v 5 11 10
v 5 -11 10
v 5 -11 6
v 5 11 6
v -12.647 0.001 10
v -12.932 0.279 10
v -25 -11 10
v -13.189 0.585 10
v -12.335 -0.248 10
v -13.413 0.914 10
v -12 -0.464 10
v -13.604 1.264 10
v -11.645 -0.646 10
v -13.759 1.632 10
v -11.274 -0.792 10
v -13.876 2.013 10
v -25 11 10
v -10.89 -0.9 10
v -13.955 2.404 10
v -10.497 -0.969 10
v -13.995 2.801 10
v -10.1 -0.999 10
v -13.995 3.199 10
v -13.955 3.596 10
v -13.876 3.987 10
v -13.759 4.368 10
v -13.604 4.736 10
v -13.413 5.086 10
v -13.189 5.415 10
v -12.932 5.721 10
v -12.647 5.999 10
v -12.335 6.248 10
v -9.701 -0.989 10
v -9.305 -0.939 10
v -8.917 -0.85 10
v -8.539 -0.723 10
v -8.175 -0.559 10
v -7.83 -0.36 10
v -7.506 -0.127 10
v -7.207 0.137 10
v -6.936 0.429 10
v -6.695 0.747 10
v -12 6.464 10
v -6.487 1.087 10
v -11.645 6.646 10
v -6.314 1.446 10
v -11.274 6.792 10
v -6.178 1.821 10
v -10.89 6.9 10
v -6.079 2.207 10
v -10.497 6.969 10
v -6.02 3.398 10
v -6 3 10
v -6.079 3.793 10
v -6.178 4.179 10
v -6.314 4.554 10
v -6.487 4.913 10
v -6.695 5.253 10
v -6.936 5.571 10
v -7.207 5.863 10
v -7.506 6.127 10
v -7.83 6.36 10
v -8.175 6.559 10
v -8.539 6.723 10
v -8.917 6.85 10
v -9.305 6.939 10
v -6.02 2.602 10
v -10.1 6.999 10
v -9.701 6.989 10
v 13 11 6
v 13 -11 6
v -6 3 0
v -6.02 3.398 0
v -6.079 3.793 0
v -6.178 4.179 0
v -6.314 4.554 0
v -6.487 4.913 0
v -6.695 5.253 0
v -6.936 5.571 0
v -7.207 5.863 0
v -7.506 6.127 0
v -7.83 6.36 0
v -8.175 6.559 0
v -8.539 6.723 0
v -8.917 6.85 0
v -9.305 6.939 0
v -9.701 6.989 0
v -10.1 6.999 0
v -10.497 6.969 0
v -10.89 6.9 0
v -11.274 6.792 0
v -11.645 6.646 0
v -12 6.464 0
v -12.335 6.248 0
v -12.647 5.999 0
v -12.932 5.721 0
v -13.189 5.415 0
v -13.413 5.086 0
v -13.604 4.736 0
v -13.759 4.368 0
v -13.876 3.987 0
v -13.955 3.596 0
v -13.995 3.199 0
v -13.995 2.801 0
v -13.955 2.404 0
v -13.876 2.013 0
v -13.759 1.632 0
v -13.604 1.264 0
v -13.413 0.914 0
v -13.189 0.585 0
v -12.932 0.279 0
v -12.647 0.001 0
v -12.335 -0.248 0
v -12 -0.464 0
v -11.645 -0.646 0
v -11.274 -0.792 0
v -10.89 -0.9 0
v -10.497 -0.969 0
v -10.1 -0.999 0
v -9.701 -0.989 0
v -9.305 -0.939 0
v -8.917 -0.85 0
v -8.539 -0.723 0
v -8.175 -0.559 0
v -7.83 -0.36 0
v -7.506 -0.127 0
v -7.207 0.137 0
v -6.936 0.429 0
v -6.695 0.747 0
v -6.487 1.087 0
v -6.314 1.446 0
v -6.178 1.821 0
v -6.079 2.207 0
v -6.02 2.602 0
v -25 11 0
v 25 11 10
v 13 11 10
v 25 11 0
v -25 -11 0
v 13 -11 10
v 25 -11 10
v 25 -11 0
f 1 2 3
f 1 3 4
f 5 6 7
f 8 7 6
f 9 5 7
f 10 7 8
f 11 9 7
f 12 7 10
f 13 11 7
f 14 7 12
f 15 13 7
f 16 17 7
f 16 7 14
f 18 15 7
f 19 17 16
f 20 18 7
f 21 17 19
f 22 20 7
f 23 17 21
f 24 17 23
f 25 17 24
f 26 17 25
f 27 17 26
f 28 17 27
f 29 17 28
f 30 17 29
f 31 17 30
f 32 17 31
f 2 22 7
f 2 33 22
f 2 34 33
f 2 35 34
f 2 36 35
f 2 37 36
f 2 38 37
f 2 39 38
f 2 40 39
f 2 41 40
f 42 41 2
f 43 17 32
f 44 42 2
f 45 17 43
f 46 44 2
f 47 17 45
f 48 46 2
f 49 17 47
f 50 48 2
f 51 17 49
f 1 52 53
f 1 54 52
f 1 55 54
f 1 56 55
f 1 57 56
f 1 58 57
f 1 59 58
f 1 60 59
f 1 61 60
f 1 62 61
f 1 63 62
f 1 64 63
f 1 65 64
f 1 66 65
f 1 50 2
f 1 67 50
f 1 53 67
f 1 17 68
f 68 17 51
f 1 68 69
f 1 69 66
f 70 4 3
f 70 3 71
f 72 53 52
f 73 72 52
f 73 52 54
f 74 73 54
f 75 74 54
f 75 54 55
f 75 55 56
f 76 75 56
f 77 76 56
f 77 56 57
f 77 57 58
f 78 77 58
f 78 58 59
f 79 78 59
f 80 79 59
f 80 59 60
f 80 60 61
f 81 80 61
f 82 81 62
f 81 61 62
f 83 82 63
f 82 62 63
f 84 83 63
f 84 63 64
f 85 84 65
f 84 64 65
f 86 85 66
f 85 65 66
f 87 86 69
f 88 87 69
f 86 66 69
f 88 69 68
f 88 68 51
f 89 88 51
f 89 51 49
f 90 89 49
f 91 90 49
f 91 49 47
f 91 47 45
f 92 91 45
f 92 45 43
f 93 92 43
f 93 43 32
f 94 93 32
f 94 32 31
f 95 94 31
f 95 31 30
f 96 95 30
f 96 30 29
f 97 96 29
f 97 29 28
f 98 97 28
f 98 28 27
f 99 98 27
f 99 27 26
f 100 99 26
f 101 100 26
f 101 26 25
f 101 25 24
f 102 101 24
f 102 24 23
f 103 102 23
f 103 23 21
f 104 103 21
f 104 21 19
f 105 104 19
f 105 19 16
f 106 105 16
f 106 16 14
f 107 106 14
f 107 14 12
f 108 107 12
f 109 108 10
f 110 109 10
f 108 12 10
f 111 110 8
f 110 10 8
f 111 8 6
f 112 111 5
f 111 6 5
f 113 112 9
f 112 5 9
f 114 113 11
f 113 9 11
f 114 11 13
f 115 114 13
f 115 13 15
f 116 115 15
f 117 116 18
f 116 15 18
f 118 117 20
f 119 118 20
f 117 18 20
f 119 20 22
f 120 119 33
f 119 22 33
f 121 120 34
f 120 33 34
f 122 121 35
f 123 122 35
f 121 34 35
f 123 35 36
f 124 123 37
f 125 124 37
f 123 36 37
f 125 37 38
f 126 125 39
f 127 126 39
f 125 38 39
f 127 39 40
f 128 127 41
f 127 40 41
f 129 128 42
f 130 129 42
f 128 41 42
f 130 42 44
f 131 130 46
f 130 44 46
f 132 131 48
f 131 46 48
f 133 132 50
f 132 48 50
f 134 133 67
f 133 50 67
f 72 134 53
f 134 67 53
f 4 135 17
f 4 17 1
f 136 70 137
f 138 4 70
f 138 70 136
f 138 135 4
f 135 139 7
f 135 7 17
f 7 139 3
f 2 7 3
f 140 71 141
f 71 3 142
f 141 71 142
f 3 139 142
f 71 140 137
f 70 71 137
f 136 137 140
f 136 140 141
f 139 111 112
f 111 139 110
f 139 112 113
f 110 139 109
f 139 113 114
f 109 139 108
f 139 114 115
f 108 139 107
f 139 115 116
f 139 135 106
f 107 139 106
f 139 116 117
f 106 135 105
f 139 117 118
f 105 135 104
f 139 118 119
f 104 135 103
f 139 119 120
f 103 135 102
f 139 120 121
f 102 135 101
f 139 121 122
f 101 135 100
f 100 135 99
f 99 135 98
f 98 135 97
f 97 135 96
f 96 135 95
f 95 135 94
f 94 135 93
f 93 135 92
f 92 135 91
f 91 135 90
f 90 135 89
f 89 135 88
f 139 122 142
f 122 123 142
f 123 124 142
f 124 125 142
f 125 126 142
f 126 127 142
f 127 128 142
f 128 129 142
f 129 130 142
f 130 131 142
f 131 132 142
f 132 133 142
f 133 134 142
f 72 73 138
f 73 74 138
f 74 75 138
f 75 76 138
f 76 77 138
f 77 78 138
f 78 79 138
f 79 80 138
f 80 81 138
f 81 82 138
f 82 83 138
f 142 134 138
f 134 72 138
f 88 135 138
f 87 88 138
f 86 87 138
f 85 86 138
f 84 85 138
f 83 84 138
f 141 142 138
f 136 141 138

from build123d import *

# Parameters (mm, degrees)
SKETCH_1_W          = 50
SKETCH_1_H          = 22
EXTRUDE_1_DEPTH     = 10
SKETCH_2_R          = 4
CUT_EXTRUDE_1_DEPTH = 30.086079144
SKETCH_3_W          = 8
SKETCH_3_H          = 22
CUT_EXTRUDE_2_DEPTH = 4


with BuildPart() as part:
    # Эскиз1 → Бобышка-Вытянуть1 (new body)
    with BuildSketch(Plane.XY):
        Rectangle(SKETCH_1_W, SKETCH_1_H)
    extrude(amount=EXTRUDE_1_DEPTH)

    # Эскиз2 → Вырез-Вытянуть1 (cut, through all)
    with BuildSketch(Plane.XY.offset(10)):
        with Locations((-10, 3)):
            Circle(SKETCH_2_R)
    extrude(amount=-CUT_EXTRUDE_1_DEPTH, mode=Mode.SUBTRACT)

    # Эскиз3 → Вырез-Вытянуть2 (cut)
    with BuildSketch(Plane.XY.offset(10)):
        with Locations((9, 0)):
            Rectangle(SKETCH_3_W, SKETCH_3_H)
    extrude(amount=-CUT_EXTRUDE_2_DEPTH, mode=Mode.SUBTRACT)


solid = part.part
